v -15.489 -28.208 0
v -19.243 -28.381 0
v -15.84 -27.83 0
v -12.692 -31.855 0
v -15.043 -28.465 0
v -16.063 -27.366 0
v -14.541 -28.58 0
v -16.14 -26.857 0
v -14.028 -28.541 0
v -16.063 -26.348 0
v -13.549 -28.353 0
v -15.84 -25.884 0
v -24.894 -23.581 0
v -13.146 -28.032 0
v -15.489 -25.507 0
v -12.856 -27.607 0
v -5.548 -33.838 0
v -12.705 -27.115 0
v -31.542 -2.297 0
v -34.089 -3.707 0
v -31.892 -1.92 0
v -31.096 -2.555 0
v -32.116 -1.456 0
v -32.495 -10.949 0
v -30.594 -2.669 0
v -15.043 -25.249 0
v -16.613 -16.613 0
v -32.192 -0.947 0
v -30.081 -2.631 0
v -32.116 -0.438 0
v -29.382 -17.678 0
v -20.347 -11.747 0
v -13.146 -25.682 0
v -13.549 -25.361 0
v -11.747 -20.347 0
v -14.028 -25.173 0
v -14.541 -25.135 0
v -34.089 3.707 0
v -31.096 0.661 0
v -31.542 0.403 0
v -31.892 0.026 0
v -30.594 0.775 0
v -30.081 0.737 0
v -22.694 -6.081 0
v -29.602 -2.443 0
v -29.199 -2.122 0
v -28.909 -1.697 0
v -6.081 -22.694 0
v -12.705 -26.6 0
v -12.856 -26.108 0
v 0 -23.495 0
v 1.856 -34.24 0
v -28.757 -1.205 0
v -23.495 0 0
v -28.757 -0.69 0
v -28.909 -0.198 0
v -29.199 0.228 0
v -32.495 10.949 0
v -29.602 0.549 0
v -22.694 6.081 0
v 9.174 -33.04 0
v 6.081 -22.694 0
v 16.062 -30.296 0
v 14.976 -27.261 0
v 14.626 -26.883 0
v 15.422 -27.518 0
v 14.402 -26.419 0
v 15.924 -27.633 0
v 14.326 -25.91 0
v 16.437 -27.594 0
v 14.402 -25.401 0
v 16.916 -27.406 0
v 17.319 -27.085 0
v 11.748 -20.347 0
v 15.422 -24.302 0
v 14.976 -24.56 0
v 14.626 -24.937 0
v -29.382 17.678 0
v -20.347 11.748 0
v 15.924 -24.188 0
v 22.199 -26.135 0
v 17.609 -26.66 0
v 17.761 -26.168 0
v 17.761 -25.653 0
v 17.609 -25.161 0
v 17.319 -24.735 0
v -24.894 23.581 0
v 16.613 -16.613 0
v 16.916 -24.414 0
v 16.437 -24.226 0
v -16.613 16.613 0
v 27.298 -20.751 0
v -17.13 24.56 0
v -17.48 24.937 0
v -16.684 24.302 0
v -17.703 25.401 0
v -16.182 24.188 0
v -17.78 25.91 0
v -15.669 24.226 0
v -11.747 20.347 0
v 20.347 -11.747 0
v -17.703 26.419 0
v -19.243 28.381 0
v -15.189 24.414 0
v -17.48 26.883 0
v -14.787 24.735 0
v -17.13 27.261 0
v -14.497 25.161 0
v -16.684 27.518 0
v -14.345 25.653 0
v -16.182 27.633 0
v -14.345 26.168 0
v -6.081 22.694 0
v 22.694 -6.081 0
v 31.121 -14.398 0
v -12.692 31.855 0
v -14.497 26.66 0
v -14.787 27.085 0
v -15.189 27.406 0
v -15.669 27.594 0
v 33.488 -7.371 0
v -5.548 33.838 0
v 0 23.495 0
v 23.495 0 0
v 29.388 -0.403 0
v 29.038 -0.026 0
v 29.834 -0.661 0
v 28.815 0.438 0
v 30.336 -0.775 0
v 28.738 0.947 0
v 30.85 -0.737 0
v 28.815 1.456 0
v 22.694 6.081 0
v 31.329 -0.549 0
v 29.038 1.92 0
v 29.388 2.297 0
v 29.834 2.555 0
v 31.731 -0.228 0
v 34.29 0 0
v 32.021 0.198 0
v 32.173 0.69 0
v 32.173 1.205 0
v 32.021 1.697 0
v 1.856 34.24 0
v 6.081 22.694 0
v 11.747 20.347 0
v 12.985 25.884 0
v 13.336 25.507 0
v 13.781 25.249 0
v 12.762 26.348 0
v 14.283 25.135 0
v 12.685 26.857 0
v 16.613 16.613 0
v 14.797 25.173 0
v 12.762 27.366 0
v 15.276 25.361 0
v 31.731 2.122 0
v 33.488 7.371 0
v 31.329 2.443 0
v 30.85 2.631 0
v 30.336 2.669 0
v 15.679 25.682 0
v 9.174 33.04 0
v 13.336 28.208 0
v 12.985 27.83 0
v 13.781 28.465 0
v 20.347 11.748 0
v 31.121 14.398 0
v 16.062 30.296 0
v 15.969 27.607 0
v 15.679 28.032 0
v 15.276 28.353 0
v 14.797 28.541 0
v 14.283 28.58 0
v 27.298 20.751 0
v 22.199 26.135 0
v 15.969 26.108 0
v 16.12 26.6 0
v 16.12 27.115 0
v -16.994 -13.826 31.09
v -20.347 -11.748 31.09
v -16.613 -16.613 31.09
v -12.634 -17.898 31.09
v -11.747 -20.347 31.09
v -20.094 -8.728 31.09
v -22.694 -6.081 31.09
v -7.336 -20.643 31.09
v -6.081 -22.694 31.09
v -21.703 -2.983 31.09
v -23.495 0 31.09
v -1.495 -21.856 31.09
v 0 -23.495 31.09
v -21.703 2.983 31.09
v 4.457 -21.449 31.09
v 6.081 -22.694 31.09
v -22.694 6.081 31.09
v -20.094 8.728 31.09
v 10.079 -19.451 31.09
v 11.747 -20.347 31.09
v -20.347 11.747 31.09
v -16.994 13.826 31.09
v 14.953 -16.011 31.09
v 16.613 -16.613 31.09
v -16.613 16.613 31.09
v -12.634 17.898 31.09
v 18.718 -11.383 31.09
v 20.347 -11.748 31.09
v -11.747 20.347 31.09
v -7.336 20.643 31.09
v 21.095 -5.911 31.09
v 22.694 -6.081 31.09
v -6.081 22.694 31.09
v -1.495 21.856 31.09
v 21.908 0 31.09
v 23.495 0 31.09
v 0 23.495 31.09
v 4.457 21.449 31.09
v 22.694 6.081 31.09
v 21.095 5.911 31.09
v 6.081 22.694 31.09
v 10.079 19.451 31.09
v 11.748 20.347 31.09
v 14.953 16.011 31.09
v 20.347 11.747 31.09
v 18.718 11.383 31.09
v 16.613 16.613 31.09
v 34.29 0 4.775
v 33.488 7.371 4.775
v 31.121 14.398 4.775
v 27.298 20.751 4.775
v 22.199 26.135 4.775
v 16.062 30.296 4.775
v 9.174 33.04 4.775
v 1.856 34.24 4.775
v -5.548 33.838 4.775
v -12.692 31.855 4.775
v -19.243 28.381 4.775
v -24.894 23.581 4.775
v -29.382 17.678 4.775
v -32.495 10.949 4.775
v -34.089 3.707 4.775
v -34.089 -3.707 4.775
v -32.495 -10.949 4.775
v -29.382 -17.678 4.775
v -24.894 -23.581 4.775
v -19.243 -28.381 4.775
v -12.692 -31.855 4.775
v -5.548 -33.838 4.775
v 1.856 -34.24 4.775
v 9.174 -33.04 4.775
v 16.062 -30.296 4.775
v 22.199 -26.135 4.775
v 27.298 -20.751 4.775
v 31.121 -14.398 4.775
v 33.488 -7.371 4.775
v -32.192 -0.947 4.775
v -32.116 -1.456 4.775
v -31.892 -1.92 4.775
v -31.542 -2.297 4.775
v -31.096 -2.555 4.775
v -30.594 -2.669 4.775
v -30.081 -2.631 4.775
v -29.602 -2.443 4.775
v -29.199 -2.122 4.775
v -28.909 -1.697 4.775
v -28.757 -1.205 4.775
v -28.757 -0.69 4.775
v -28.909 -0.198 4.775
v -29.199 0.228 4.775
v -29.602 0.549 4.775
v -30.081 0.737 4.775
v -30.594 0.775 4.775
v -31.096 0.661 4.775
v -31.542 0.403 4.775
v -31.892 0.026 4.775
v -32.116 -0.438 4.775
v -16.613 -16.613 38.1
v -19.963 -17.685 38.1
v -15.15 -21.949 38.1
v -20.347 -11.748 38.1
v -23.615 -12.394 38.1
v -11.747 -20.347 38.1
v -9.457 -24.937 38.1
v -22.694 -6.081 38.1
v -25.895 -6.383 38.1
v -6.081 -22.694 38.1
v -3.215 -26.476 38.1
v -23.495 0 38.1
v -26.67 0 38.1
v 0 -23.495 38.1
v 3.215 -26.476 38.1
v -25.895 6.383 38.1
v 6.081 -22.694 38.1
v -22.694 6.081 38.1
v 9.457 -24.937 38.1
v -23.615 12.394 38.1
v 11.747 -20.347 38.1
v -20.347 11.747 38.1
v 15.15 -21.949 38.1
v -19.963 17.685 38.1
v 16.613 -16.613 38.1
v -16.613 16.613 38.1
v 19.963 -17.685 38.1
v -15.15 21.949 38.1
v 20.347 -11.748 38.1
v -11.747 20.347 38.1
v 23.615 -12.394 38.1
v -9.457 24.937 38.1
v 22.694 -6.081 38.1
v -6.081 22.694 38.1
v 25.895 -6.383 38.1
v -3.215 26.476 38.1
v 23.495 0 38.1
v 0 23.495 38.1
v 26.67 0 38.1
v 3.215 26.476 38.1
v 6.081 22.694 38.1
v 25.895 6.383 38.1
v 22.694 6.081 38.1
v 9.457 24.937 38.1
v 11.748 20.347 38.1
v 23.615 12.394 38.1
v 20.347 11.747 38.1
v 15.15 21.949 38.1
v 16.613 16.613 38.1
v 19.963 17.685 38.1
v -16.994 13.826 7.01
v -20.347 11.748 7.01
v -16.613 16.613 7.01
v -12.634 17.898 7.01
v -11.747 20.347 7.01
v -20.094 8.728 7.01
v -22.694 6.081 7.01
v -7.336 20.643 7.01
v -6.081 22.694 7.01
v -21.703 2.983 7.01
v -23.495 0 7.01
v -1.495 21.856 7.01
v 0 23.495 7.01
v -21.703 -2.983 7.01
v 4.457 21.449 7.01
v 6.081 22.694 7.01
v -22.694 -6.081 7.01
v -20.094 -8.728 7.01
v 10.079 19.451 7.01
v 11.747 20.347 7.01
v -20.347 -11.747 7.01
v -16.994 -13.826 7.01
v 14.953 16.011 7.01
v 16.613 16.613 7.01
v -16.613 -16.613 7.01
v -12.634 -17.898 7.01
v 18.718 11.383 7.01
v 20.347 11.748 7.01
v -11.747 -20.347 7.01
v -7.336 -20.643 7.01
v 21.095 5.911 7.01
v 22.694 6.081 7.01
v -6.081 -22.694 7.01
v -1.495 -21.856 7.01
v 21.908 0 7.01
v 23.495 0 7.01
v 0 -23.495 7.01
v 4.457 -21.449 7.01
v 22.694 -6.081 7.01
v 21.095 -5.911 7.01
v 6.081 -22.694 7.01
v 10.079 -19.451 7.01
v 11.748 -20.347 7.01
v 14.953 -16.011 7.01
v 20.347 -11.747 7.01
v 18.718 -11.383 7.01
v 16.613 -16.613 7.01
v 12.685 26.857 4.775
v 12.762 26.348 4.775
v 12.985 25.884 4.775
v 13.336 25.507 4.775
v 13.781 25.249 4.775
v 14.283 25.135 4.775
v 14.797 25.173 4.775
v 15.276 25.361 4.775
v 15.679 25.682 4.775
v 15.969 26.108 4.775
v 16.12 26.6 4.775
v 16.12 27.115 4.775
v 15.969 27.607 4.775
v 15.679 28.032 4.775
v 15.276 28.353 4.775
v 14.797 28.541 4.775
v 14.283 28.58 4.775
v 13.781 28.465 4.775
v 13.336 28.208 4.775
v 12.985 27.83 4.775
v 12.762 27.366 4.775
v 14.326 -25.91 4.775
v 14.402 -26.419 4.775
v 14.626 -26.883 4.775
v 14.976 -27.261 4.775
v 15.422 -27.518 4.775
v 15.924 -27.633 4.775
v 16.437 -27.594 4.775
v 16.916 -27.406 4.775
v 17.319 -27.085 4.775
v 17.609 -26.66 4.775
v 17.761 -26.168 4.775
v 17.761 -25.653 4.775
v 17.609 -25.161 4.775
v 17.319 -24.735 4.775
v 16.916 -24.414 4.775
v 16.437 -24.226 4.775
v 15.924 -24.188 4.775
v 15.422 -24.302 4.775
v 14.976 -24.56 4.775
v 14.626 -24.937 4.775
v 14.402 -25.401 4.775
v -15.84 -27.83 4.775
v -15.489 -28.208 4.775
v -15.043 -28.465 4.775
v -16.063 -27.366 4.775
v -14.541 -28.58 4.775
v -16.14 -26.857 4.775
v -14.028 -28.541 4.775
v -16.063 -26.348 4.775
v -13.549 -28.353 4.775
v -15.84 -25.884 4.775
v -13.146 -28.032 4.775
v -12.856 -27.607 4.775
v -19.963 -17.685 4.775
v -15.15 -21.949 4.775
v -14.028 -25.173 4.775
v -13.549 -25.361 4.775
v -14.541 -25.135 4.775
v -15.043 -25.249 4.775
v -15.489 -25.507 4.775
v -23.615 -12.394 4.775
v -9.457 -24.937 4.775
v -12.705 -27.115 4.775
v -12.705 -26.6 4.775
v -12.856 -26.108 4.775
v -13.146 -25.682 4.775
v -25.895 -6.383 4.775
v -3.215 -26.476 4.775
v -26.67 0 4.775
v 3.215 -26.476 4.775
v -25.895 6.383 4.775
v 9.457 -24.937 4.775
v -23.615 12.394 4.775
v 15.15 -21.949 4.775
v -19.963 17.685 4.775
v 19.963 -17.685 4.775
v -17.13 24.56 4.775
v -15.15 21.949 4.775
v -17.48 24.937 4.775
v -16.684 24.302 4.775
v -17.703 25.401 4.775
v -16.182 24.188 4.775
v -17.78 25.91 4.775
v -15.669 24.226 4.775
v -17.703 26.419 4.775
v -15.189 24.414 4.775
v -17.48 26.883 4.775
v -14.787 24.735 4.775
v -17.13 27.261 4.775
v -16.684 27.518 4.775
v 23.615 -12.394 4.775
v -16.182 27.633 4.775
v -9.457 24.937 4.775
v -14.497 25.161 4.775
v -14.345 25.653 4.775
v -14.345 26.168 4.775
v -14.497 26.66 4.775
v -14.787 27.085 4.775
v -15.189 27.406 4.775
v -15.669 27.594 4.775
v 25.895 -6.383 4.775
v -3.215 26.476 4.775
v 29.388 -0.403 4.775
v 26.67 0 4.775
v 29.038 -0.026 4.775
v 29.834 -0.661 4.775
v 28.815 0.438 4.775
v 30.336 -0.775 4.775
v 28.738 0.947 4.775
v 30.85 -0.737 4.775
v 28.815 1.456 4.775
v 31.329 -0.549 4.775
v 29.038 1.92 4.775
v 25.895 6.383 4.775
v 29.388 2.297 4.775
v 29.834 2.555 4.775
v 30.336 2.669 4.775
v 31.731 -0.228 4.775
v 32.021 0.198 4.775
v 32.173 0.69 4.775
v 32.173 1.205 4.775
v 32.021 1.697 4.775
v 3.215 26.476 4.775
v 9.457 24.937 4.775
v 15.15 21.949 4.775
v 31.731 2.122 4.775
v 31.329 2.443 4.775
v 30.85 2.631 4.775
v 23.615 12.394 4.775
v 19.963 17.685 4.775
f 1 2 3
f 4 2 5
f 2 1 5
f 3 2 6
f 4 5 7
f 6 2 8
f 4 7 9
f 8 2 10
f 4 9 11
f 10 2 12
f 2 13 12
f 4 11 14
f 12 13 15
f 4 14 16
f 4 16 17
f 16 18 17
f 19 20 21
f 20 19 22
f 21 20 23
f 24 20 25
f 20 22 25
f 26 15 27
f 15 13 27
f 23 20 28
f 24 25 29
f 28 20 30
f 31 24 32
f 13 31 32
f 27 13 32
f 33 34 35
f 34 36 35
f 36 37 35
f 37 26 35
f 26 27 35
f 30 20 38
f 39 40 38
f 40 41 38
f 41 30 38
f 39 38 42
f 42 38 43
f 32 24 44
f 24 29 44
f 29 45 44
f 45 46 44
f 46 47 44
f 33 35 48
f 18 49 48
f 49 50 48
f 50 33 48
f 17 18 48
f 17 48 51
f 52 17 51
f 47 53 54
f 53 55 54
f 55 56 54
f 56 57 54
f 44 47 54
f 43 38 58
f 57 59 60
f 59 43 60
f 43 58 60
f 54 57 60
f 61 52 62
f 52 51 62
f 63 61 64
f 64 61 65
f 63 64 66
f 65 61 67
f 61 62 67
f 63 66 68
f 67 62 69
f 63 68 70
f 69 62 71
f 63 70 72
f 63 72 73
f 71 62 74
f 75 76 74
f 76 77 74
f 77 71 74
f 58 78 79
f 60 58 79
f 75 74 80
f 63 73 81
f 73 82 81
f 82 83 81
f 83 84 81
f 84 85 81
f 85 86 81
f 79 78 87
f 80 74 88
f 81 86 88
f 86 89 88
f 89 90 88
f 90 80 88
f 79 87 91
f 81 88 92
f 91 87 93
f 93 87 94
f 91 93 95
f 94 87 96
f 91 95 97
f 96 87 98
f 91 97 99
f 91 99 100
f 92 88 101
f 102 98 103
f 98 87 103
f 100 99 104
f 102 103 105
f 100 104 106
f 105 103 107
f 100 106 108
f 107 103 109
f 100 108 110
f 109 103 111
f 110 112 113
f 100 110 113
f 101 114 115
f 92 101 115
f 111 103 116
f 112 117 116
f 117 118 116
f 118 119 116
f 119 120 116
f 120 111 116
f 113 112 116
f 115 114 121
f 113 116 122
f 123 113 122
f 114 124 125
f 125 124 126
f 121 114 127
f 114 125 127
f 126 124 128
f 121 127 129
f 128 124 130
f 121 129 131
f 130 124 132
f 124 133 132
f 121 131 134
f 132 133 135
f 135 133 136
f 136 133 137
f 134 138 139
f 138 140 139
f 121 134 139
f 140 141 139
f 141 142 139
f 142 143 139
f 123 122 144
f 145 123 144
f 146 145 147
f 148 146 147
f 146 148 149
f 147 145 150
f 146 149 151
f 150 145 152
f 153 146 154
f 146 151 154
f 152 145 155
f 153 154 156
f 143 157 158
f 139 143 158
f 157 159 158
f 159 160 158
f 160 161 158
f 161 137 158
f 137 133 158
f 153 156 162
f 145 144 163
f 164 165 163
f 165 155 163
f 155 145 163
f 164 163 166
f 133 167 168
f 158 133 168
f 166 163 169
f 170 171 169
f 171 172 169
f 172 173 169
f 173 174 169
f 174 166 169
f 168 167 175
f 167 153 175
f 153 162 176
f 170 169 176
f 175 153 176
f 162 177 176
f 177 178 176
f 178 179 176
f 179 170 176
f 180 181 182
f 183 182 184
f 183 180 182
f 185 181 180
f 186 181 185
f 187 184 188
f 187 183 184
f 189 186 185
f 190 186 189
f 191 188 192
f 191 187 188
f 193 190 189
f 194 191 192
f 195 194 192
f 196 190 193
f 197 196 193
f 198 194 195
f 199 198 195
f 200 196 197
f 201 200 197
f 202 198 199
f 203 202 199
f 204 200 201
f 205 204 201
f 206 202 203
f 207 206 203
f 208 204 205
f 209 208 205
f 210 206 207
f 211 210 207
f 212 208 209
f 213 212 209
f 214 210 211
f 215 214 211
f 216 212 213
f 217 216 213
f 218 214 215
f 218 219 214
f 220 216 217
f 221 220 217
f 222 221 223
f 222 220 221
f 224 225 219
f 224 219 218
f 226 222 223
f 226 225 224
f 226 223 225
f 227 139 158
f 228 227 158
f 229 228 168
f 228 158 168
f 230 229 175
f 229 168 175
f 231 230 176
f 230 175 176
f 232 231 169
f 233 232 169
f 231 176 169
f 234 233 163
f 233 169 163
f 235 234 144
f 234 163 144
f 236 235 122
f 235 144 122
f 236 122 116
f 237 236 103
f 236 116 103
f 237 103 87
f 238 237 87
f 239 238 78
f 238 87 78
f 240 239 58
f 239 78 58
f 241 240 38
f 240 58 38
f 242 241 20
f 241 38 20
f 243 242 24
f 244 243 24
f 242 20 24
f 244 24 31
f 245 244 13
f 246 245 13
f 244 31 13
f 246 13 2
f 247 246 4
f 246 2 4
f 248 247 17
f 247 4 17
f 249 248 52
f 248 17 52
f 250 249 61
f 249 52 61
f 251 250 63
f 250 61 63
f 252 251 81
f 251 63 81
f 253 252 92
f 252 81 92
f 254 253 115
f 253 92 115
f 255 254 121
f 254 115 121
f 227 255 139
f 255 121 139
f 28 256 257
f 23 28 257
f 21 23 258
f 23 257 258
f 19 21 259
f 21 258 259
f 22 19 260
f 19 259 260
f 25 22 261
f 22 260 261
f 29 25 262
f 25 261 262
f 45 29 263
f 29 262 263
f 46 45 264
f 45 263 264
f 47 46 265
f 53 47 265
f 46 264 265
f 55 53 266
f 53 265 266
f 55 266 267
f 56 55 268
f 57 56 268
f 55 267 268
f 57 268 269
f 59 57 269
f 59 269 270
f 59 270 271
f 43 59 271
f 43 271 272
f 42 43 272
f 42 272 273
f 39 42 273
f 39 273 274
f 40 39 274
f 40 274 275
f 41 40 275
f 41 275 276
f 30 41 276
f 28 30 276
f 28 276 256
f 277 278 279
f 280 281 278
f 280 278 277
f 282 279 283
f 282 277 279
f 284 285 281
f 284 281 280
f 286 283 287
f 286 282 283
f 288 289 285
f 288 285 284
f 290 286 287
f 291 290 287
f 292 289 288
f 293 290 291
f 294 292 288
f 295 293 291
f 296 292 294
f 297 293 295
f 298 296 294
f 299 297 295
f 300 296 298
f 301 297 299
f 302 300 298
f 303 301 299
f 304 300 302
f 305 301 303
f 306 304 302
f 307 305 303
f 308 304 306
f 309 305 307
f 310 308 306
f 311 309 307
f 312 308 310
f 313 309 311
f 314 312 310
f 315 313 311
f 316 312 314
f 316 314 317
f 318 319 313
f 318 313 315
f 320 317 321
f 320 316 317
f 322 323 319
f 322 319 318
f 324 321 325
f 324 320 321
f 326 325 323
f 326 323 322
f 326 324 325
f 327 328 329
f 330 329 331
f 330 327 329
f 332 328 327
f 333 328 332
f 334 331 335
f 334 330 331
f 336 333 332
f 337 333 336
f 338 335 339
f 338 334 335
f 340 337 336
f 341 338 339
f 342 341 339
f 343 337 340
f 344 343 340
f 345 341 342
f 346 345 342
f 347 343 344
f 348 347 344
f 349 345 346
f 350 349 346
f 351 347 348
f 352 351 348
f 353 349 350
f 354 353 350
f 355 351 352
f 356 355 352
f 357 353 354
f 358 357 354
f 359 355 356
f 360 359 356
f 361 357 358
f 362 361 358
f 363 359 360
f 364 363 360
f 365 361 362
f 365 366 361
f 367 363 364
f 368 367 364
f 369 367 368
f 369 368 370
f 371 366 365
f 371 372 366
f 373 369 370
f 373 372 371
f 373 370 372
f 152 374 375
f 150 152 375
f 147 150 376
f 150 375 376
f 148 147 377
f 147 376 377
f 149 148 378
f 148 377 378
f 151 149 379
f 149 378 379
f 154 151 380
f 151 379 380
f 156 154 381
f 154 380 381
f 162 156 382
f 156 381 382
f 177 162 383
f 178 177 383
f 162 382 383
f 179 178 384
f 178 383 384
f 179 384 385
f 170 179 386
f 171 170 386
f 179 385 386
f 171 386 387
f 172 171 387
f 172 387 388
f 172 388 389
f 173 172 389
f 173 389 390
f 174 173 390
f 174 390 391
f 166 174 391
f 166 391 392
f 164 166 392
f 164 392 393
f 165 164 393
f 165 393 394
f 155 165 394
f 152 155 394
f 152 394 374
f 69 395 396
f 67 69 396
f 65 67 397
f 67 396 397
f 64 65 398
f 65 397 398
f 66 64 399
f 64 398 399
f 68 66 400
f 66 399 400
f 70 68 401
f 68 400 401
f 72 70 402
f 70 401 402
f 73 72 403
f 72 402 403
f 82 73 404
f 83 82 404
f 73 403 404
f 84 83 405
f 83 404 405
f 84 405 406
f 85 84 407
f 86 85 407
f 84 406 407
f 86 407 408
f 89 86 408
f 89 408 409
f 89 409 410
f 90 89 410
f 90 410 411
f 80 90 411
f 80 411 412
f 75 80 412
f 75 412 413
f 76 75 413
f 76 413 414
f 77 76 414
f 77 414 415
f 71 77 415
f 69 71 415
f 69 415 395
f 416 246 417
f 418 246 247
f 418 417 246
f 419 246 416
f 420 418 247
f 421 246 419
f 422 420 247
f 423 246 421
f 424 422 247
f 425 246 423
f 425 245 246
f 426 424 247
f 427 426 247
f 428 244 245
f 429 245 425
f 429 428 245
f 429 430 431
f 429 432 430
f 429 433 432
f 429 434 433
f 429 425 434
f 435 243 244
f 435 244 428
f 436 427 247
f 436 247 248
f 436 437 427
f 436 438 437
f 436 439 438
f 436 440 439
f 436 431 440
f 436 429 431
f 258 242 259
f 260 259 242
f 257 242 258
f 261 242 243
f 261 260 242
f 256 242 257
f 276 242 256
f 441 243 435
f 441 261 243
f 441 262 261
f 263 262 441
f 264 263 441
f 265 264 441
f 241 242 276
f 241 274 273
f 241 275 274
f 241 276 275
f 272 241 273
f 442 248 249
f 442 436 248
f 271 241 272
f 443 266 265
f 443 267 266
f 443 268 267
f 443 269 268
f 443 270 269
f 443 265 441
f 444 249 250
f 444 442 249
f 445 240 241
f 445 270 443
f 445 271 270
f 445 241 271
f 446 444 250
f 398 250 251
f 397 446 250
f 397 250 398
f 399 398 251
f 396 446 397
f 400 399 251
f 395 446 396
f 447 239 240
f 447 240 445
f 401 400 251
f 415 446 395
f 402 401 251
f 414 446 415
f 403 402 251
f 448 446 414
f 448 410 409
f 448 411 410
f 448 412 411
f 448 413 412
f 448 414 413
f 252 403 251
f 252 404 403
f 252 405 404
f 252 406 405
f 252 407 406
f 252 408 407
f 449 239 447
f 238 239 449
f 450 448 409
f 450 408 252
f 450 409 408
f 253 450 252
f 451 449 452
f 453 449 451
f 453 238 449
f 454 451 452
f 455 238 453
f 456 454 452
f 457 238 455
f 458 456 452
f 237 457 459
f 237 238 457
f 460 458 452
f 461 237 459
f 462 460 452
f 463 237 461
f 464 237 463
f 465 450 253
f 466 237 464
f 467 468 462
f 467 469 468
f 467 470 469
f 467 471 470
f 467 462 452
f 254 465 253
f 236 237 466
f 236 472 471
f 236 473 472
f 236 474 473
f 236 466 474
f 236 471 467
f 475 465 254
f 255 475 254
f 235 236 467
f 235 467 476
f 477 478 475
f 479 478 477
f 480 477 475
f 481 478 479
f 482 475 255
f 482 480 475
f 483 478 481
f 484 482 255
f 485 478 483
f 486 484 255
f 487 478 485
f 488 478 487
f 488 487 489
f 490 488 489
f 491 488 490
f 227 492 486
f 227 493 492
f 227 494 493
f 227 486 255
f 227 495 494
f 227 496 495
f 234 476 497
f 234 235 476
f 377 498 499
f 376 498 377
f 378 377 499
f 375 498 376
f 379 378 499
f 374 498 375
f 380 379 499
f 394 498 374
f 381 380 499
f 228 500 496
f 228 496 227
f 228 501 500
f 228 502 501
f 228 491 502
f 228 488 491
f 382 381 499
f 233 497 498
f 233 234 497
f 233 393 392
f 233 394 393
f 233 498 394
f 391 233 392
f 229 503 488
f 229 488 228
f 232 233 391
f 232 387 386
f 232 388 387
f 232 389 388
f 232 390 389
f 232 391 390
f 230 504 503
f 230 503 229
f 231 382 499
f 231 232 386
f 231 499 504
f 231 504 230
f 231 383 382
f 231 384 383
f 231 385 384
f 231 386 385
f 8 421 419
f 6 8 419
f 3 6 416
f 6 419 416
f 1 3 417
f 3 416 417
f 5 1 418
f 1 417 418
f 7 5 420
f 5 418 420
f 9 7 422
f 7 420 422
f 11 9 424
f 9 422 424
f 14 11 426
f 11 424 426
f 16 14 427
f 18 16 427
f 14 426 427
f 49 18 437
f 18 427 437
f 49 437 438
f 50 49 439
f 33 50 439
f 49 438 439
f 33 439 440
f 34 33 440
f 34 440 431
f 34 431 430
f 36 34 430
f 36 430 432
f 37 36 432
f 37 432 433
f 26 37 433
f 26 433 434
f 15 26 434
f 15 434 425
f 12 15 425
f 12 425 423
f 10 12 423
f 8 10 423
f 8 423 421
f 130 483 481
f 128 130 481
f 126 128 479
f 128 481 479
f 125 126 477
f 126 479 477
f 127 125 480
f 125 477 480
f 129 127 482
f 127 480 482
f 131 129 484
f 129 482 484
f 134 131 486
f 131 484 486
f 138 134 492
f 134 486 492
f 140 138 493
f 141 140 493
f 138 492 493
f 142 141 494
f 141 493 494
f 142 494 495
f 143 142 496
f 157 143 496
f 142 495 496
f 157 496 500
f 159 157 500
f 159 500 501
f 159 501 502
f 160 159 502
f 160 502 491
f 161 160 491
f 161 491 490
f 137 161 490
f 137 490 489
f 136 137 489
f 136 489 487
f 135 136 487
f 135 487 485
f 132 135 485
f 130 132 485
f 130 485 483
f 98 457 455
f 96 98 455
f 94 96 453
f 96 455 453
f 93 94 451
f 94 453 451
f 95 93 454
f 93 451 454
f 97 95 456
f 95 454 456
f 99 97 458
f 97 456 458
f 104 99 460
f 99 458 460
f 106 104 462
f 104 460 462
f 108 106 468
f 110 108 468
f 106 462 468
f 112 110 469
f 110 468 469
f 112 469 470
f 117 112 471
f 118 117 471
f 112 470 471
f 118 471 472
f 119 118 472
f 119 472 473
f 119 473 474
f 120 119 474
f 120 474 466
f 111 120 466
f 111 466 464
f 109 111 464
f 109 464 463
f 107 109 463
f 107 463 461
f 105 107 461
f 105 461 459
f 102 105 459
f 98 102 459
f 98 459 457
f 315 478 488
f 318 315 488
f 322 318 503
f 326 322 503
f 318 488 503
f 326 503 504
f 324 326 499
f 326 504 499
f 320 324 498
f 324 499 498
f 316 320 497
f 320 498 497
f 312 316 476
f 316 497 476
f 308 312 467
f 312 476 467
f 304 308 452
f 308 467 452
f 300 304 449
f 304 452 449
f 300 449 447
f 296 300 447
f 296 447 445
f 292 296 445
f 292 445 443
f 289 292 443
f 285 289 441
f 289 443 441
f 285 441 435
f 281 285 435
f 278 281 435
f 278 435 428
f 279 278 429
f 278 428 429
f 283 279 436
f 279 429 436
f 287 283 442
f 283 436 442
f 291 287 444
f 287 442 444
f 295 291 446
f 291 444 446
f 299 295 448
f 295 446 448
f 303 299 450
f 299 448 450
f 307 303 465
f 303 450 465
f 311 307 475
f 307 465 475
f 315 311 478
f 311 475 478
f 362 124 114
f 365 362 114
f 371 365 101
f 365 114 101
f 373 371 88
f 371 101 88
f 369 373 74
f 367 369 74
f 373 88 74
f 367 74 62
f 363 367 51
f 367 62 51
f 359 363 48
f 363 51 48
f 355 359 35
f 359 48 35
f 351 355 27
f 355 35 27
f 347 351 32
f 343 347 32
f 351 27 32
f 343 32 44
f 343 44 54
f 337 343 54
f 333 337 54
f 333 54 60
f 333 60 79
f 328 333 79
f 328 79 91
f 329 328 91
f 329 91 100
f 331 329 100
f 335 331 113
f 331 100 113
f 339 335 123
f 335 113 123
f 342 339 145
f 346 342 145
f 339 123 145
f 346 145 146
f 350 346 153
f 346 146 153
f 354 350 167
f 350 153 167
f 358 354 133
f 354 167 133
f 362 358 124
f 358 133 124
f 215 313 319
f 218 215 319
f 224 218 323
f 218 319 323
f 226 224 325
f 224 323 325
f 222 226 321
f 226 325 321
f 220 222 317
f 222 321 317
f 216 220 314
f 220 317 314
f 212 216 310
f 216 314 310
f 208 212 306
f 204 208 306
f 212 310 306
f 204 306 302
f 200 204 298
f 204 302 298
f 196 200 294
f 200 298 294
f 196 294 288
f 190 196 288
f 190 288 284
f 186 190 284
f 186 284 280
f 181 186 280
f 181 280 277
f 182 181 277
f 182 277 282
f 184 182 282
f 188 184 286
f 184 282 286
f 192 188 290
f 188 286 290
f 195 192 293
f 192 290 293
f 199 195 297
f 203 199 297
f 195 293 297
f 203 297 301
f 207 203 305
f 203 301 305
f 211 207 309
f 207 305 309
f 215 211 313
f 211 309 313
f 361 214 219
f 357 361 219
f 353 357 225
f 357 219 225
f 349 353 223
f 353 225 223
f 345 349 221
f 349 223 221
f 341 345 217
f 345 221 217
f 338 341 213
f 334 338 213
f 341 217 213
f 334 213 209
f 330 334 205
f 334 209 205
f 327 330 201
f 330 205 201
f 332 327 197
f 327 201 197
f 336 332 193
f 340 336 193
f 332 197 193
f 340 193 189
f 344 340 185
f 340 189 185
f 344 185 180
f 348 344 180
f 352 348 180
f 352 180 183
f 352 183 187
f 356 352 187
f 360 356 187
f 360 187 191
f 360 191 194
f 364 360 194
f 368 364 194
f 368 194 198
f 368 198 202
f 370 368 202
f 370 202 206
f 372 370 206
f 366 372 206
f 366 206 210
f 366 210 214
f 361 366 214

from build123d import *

# Parameters (mm, degrees)
F0_R     = 34.29
F1_DEPTH = 4.7752
F2_R     = 26.67
F3_DEPTH = 33.3248
F4_R     = 21.9075
F5_DEPTH = 38.101
F6_R     = 23.495
F7_DEPTH = 7.0104
F8_R     = 23.495
F9_DEPTH = 7.0104
F11_D    = 3.4544


with BuildPart() as f1:
    # F0 (on Top) → F1 (new body)
    with BuildSketch(Plane.XY):
        Circle(F0_R)
    extrude(amount=F1_DEPTH)

    # F2 (on face) → F3 (join)
    with BuildSketch(Plane.XY.offset(4.7752)):
        Circle(F2_R)
    extrude(amount=F3_DEPTH)

    # F4 (on face) → F5 (cut, through all)
    with BuildSketch(Plane.XY.offset(38.1)):
        Circle(F4_R)
    extrude(amount=-F5_DEPTH, mode=Mode.SUBTRACT)

    # F6 (on face) → F7 (cut)
    with BuildSketch(Plane.XY.offset(38.1)):
        Circle(F6_R)
    extrude(amount=-F7_DEPTH, mode=Mode.SUBTRACT)

    # F8 (on face) → F9 (cut)
    with BuildSketch(Plane(origin=(0, 0, 0), x_dir=(1, 0, 0), z_dir=(0, 0, -1))):
        Circle(F8_R)
    extrude(amount=-F9_DEPTH, mode=Mode.SUBTRACT)

    # F11 (through all)
    with Locations(Plane(origin=(0, 0, 0), x_dir=(1, 0, 0), z_dir=(0, 0, -1))):
        with Locations((-16.052859, -25.910155), (-30.465282, 0.947107), (-14.412422, 26.857261), (16.052859, 25.910155), (30.465282, -0.947107), (14.412422, -26.857261)):
            Hole(F11_D / 2)


solid = f1.part
